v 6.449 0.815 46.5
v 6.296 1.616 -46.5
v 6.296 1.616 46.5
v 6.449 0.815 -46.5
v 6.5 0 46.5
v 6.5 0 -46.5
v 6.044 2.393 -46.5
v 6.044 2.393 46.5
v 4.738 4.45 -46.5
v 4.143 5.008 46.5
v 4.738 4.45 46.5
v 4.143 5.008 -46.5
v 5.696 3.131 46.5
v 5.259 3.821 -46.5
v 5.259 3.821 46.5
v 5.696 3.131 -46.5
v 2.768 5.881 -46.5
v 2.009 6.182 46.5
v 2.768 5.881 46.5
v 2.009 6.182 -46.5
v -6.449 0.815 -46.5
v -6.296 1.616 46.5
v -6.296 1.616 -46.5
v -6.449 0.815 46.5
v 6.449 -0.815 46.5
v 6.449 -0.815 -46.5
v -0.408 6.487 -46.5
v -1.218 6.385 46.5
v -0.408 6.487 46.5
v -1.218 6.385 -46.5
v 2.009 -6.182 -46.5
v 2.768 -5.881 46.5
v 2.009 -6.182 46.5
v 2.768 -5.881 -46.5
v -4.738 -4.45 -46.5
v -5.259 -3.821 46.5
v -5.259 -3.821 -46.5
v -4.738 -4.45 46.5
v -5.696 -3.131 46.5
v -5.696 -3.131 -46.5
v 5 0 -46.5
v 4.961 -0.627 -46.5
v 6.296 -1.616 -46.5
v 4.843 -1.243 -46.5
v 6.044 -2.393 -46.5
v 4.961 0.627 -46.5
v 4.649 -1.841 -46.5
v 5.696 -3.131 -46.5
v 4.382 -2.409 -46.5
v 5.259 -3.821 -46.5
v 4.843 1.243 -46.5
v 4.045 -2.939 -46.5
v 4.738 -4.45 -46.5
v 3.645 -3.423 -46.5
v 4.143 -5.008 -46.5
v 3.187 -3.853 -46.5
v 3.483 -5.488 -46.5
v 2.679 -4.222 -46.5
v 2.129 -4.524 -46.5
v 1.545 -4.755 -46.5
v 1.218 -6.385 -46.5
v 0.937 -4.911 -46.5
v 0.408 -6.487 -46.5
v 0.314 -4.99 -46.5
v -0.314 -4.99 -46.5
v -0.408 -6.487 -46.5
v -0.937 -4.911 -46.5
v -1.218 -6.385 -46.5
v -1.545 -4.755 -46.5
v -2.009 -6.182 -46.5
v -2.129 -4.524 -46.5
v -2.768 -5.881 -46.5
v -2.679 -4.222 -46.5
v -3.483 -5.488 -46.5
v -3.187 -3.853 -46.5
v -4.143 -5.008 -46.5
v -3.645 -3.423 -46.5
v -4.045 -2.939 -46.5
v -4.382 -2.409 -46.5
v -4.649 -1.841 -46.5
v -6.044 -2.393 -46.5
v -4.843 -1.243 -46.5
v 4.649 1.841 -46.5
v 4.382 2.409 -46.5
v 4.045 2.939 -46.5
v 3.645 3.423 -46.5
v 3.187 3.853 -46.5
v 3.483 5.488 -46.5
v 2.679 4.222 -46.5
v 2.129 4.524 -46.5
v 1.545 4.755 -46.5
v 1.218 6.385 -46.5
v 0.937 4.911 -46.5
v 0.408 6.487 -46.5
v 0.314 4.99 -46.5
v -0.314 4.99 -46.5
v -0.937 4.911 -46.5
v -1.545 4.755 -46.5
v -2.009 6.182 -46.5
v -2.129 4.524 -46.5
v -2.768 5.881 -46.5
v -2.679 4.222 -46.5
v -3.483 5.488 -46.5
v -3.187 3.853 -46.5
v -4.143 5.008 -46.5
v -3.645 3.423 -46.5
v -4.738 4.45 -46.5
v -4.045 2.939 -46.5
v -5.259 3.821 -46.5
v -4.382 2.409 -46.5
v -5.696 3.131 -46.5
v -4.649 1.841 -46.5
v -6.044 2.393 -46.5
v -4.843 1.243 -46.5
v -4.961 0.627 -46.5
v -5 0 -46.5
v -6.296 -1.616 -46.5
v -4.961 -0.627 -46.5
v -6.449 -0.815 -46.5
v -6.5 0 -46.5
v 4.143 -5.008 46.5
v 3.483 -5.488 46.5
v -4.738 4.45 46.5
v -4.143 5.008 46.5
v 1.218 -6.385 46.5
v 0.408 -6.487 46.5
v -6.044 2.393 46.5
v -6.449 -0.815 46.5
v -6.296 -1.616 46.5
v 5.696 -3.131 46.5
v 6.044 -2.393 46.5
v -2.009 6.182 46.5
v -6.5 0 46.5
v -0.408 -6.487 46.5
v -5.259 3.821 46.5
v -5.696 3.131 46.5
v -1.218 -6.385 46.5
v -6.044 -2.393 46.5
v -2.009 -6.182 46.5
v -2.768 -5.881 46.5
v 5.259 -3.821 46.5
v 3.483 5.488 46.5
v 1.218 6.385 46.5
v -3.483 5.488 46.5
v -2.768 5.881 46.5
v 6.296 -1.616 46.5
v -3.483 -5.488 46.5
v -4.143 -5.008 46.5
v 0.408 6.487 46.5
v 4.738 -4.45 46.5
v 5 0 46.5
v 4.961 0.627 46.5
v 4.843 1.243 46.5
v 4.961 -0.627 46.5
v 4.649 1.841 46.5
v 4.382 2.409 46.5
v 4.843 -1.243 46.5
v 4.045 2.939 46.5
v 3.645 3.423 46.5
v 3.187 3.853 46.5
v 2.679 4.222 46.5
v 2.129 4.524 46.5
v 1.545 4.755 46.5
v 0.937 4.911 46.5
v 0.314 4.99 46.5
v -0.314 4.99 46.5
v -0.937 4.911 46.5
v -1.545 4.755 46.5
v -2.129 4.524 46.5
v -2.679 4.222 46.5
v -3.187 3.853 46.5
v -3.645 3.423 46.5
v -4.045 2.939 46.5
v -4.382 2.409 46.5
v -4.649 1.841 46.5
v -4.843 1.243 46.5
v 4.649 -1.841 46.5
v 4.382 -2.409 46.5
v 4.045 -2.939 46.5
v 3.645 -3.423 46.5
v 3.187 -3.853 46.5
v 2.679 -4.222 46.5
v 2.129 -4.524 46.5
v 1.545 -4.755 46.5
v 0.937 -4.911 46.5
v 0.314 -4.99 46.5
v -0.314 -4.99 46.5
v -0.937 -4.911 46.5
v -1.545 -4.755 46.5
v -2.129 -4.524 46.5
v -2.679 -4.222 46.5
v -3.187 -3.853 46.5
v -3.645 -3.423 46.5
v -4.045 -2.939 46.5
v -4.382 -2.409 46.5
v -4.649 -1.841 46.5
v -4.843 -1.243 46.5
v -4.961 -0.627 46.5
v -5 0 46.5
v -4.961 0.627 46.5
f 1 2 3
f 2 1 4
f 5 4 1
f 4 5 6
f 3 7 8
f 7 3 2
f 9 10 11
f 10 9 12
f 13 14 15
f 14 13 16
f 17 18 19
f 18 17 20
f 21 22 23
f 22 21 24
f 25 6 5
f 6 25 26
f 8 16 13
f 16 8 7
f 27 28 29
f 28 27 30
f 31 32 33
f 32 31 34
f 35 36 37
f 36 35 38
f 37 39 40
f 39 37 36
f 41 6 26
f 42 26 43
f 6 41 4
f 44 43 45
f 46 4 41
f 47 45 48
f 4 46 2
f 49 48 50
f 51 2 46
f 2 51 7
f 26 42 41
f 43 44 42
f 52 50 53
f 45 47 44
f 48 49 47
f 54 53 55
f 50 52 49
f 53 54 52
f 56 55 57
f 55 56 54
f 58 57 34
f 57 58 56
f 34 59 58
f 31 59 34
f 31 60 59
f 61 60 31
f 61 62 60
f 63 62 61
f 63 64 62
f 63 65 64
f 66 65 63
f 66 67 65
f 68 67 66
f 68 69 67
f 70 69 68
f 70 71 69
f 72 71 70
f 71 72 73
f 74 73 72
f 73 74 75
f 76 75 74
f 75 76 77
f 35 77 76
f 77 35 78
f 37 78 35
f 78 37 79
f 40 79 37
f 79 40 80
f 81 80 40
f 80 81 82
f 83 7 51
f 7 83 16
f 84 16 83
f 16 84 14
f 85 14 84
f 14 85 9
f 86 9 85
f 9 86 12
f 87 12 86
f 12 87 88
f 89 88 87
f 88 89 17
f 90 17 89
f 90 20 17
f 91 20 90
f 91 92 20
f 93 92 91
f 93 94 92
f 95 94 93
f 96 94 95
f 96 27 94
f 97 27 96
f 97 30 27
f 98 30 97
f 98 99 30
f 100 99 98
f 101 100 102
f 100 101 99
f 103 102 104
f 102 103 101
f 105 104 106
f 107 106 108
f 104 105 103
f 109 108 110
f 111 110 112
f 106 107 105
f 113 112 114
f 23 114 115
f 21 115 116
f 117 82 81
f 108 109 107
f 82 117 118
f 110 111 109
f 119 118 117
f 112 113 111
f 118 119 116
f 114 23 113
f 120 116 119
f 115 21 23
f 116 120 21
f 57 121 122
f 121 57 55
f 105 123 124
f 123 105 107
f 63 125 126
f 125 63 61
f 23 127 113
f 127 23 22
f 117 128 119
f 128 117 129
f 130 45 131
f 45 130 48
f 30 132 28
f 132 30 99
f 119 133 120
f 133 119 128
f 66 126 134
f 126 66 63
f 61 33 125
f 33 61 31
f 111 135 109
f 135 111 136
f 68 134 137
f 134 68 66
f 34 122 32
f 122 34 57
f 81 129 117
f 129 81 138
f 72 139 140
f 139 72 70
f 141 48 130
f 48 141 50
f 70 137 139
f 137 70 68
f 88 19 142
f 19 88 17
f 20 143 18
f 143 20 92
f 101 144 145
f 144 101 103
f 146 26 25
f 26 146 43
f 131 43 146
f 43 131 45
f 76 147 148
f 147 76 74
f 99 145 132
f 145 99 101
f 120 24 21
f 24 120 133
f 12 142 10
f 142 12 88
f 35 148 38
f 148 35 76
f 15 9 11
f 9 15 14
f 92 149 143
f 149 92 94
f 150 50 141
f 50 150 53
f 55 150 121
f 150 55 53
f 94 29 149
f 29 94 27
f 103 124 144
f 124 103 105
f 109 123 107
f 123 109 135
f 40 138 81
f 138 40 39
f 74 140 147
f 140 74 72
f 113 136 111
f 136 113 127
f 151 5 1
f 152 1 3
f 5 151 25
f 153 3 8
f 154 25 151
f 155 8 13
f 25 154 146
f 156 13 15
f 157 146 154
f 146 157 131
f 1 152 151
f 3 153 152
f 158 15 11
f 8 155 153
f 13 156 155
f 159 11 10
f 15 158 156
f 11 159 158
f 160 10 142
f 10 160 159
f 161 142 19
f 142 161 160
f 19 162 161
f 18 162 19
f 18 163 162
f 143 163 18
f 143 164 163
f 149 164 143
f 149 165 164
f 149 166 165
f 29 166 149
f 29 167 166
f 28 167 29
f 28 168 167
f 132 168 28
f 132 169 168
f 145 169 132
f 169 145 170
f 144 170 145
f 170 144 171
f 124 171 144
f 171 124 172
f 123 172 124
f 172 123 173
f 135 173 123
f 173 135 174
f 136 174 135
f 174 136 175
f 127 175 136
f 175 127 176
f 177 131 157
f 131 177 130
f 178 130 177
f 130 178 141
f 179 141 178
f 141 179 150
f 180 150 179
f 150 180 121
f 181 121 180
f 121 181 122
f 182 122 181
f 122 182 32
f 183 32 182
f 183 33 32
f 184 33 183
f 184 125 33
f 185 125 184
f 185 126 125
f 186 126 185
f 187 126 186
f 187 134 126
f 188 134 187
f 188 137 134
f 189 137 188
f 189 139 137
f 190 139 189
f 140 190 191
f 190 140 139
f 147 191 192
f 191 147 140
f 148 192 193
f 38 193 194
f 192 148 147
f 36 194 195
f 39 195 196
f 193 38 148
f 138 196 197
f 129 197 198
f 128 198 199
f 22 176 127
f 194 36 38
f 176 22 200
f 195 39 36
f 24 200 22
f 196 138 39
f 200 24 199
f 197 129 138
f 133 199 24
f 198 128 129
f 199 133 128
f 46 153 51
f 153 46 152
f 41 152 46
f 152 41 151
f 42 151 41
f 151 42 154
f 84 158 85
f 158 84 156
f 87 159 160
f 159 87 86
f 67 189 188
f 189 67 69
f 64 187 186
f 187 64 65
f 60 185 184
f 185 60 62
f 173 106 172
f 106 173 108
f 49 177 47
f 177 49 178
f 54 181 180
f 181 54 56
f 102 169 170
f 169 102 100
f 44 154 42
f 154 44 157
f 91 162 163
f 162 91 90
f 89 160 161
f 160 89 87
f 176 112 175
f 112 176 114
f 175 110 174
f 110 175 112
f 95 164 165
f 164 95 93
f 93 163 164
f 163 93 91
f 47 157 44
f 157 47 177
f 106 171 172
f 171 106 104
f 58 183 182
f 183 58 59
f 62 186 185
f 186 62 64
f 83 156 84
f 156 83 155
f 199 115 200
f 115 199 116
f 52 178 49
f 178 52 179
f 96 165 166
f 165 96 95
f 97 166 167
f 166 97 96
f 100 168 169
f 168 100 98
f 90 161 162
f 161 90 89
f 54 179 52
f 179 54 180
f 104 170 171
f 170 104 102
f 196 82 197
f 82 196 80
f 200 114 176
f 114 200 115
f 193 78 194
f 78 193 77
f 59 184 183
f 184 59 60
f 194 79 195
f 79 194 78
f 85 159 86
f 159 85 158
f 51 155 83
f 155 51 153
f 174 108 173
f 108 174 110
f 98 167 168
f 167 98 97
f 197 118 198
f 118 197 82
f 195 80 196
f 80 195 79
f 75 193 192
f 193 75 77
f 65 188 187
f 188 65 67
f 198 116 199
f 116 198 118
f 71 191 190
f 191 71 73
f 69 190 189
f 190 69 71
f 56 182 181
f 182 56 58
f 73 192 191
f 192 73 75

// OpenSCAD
$fn = 50;


difference() {
	union() {
		translate(v = [0, 0, -46.5000000000]) {
			cylinder(h = 93, r = 6.5000000000);
		}
	}
	union() {
		translate(v = [0, 0, -100.0000000000]) {
			cylinder(h = 200, r = 5.0000000000);
		}
	}
}
